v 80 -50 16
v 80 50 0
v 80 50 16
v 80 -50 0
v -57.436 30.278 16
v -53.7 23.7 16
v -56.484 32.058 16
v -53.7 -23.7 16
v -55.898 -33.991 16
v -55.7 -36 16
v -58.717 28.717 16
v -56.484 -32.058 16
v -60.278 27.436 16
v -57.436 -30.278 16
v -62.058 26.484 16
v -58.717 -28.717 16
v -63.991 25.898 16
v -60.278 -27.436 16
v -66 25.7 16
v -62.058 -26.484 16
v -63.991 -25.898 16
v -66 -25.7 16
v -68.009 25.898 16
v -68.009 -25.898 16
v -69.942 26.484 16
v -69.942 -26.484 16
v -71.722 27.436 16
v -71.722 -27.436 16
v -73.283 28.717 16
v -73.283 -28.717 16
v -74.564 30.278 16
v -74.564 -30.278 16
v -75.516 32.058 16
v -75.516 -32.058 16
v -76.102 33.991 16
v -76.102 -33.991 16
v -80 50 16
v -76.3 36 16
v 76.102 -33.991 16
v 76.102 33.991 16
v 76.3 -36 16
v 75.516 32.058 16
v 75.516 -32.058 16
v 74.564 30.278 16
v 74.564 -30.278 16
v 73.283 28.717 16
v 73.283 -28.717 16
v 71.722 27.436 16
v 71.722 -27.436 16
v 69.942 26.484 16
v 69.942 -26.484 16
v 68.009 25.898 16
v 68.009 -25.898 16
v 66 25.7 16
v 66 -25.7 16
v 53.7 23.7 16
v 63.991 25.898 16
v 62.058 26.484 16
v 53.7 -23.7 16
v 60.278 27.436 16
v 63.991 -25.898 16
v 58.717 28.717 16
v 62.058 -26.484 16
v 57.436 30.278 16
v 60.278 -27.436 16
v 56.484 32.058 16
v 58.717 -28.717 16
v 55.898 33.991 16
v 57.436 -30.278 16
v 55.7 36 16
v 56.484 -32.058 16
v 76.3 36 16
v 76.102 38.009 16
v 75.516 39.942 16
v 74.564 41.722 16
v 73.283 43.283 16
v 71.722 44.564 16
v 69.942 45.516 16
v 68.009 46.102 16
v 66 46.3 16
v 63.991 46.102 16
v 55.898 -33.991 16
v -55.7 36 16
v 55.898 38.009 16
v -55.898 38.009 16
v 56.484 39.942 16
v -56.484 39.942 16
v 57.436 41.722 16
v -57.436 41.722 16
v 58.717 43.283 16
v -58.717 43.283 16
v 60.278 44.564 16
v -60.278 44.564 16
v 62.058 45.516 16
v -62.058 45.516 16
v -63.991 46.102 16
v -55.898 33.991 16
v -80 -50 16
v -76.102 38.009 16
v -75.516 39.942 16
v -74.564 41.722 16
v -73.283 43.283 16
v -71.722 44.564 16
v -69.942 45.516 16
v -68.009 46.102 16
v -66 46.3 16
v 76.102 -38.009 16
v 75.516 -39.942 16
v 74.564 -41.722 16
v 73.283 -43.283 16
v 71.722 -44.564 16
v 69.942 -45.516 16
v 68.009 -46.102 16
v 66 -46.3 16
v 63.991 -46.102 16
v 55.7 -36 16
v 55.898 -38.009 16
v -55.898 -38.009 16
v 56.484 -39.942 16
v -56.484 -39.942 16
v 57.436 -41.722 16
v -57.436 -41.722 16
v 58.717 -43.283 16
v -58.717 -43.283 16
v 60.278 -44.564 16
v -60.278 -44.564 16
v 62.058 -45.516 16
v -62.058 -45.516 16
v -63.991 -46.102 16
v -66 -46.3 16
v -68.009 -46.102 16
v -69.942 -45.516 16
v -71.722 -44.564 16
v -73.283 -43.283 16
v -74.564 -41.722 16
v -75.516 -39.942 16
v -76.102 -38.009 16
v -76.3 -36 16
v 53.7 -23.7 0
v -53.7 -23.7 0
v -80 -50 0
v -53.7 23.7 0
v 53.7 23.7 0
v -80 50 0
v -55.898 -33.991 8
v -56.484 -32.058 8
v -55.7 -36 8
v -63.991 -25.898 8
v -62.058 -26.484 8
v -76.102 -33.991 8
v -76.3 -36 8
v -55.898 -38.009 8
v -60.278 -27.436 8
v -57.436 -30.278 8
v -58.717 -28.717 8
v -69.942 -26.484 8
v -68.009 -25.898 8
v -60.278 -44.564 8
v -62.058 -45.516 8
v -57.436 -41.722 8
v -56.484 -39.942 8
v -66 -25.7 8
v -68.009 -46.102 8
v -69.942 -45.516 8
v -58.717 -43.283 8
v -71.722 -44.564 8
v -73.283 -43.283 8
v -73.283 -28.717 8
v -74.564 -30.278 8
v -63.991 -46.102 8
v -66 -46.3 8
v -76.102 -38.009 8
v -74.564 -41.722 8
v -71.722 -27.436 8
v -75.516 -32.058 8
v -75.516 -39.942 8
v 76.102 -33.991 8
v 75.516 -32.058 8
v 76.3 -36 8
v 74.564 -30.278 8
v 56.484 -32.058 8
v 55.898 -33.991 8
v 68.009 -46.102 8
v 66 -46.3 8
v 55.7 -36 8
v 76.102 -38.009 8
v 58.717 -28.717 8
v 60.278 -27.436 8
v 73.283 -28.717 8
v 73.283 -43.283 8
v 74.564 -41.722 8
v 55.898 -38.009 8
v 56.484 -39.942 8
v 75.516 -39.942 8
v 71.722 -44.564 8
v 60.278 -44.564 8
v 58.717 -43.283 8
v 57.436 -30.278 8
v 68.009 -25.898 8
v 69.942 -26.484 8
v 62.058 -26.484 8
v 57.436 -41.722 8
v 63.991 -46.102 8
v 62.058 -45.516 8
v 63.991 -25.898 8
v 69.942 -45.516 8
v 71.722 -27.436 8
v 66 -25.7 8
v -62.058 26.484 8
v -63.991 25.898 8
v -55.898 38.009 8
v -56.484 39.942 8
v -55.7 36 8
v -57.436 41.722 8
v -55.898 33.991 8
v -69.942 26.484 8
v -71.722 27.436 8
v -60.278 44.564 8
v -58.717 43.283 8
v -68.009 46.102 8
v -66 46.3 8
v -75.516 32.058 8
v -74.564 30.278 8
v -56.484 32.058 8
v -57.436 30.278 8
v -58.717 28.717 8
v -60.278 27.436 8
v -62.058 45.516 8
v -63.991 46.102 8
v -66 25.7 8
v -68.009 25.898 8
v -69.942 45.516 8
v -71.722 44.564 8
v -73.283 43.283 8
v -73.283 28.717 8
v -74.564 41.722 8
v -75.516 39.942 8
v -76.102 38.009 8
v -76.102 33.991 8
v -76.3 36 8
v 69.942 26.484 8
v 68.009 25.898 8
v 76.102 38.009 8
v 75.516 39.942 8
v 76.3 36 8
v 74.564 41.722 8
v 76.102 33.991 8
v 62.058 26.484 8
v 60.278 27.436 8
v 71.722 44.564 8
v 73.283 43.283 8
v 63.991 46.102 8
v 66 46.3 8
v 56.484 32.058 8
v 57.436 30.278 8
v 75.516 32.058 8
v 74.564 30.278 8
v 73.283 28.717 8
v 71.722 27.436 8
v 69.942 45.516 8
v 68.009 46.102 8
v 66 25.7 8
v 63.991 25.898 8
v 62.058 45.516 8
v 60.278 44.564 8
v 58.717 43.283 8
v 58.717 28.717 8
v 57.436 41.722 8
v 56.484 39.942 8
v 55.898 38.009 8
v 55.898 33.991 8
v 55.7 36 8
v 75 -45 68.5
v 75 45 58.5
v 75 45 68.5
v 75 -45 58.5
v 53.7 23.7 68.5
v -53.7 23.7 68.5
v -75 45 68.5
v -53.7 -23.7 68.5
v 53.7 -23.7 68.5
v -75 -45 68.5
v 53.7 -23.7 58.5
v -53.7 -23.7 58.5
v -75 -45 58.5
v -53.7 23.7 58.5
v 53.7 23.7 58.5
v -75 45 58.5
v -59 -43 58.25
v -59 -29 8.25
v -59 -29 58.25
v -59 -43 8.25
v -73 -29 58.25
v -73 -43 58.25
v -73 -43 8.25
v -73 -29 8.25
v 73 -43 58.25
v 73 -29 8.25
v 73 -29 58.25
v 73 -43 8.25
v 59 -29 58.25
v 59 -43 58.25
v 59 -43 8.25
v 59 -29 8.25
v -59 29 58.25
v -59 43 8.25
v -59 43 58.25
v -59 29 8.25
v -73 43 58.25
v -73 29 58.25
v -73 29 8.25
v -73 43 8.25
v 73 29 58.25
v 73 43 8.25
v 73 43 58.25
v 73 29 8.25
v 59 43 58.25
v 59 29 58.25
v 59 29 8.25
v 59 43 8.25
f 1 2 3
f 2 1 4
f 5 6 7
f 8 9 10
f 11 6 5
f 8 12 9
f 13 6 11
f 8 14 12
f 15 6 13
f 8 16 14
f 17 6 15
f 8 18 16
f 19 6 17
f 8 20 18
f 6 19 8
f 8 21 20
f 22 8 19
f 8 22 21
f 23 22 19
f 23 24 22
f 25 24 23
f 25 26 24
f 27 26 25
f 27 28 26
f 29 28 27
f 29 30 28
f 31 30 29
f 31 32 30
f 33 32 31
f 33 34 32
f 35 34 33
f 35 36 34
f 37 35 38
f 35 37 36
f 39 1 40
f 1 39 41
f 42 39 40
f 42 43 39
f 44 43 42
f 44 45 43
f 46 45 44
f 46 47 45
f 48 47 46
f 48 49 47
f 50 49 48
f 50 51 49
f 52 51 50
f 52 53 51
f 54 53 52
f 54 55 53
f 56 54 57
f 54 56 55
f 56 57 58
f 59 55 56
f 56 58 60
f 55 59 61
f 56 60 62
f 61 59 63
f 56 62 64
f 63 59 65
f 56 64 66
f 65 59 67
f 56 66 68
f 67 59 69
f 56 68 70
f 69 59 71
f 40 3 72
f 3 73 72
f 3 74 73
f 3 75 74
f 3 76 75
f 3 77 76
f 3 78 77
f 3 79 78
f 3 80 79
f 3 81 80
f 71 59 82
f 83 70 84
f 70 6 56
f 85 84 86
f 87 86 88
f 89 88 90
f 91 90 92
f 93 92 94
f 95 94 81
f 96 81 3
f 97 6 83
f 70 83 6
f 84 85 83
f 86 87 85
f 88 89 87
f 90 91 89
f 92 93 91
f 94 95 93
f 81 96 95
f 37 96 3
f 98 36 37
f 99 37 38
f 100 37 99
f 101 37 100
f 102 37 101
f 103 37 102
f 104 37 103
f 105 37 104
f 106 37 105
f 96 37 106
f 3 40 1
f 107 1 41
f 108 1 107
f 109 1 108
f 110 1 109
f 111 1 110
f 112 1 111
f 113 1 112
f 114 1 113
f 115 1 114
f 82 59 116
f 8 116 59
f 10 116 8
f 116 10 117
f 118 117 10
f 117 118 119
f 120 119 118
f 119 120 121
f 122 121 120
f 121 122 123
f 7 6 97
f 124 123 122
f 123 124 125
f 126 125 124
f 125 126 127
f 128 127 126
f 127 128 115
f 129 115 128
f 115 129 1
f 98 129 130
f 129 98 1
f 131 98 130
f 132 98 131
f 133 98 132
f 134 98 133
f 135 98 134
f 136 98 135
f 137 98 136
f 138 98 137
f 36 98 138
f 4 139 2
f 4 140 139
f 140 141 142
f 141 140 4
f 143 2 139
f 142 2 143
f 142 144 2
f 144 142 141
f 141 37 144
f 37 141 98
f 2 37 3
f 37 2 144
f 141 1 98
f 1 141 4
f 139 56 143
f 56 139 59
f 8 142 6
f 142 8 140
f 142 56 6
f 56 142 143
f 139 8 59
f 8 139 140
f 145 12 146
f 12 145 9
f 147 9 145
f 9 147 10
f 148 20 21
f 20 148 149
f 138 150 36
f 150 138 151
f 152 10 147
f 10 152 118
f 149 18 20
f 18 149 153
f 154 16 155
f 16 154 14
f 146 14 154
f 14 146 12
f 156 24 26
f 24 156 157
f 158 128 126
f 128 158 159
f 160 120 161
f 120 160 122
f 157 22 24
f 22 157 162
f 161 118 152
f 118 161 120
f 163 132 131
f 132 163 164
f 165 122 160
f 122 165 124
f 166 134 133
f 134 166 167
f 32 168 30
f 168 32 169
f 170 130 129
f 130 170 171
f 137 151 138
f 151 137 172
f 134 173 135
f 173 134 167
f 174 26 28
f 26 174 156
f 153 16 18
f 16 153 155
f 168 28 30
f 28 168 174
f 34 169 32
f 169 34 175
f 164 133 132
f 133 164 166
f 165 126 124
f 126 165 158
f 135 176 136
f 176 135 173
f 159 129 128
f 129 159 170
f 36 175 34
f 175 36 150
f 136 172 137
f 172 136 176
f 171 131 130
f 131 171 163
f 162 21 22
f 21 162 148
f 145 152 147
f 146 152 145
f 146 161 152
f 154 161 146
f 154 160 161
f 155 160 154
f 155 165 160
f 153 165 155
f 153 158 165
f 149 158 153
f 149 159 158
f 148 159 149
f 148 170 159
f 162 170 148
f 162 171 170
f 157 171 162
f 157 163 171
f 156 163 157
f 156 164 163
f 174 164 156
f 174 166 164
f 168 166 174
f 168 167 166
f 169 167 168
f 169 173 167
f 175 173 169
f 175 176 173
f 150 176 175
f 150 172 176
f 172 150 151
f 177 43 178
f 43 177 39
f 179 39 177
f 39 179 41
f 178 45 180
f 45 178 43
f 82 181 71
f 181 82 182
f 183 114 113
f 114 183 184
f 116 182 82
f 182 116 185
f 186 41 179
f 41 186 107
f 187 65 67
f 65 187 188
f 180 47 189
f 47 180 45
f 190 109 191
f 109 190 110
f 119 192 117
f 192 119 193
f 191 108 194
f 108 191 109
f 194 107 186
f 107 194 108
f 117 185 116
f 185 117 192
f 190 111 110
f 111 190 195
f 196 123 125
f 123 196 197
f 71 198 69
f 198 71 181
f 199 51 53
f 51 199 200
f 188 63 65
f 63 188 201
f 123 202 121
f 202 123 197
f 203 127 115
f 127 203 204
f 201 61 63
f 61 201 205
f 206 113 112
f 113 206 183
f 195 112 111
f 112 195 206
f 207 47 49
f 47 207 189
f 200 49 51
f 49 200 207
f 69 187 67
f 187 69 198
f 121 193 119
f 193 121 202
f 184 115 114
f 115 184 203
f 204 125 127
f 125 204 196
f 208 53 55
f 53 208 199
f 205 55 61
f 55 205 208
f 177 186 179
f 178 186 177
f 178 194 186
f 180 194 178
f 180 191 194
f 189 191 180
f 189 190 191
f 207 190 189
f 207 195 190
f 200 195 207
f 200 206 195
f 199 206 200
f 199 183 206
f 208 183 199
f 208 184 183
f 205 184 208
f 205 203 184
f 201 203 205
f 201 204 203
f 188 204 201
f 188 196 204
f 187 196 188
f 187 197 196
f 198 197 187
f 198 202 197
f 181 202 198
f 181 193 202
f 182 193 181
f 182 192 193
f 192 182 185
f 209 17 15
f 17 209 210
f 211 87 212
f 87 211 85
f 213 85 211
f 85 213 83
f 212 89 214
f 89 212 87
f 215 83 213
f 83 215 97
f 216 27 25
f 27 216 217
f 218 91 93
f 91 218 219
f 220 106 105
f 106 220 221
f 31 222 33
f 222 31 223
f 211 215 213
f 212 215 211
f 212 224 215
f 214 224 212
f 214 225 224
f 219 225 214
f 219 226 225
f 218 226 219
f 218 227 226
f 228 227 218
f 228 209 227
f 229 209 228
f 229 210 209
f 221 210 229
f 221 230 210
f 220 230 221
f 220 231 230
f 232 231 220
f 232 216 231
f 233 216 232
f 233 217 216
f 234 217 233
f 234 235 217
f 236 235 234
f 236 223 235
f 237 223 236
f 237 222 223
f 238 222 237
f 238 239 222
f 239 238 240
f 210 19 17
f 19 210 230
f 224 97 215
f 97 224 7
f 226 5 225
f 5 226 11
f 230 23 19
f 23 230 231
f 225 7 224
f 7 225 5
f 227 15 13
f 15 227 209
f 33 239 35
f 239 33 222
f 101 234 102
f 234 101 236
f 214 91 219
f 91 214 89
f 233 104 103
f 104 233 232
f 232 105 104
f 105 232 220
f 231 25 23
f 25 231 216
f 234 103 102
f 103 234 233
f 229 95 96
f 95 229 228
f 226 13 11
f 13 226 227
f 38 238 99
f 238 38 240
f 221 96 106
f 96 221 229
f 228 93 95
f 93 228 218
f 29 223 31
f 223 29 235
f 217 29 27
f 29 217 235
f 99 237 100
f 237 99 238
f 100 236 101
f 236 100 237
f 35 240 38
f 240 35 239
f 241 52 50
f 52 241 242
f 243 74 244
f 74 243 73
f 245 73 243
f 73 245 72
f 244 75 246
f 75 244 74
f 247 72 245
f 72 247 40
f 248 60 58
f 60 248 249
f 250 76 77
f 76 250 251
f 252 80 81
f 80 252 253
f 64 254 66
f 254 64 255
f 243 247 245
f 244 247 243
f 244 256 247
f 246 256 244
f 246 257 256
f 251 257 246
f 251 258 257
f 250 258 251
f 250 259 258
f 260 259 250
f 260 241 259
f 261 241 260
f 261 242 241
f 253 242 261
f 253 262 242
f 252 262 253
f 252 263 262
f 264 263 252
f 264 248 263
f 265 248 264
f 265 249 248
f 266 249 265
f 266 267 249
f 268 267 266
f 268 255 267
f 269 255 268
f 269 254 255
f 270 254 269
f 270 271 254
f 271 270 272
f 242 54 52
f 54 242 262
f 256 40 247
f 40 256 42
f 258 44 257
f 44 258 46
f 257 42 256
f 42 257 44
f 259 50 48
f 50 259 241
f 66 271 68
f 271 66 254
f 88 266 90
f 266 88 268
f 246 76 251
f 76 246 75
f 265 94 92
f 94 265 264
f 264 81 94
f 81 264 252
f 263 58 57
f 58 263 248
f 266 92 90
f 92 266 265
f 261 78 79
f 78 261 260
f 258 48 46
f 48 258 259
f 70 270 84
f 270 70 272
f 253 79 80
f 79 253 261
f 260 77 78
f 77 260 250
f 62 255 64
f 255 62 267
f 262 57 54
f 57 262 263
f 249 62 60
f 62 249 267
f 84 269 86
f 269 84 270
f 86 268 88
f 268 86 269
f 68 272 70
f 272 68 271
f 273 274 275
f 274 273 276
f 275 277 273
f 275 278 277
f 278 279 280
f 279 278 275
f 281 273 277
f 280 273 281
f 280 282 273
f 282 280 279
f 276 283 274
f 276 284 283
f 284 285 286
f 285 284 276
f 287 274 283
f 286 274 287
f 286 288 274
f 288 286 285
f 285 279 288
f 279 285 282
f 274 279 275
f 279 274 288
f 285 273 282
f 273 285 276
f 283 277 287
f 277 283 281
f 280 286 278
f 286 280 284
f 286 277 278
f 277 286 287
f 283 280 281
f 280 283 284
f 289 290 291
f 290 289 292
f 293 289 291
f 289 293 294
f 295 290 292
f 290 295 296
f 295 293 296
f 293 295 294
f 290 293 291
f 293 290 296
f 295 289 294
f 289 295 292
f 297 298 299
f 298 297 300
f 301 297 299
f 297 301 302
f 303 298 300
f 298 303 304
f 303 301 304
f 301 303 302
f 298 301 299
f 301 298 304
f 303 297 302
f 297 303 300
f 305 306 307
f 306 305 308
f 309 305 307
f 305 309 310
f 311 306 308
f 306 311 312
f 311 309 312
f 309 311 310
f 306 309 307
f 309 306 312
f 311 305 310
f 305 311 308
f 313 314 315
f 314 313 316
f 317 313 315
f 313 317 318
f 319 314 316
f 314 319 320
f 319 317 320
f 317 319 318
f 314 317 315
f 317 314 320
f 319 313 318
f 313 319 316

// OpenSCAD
$fn = 32;

// ------------------------------------------------------------------------
// Frame cube: base 160 x 100 mm, posts 50 mm tall
// Every part is its own module, assembly() places every instance.
// ------------------------------------------------------------------------

// --- part 1 ---
module base_frame() {
  difference() {
    translate([-80, -50, 0]) cube([160, 100, 16]);
    translate([-53.7, -23.7, -1]) cube([107.4, 47.4, 18]);
    translate([-66, -36, 8]) cylinder(h = 9, d = 20.6);
    translate([66, -36, 8]) cylinder(h = 9, d = 20.6);
    translate([-66, 36, 8]) cylinder(h = 9, d = 20.6);
    translate([66, 36, 8]) cylinder(h = 9, d = 20.6);
  }
}

// --- part 2 ---
module corner_post() {
  translate([-7, -7, 0]) cube([14, 14, 50]);
}

// --- part 3 ---
module top_frame() {
  difference() {
    translate([-75, -45, 0]) cube([150, 90, 10]);
    translate([-53.7, -23.7, -1]) cube([107.4, 47.4, 12]);
  }
}

// --- assembly ---
module assembly() {
  color([0.80, 0.24, 0.20]) translate([0, 0, 0]) rotate([0, 0, 0]) base_frame();
  color([0.20, 0.45, 0.75]) translate([-66, -36, 8.25]) rotate([0, 0, 0]) corner_post();
  color([0.25, 0.62, 0.32]) translate([66, -36, 8.25]) rotate([0, 0, 0]) corner_post();
  color([0.92, 0.70, 0.18]) translate([-66, 36, 8.25]) rotate([0, 0, 0]) corner_post();
  color([0.58, 0.35, 0.70]) translate([66, 36, 8.25]) rotate([0, 0, 0]) corner_post();
  color([0.16, 0.66, 0.66]) translate([0, 0, 58.5]) rotate([0, 0, 0]) top_frame();
}

assembly();
